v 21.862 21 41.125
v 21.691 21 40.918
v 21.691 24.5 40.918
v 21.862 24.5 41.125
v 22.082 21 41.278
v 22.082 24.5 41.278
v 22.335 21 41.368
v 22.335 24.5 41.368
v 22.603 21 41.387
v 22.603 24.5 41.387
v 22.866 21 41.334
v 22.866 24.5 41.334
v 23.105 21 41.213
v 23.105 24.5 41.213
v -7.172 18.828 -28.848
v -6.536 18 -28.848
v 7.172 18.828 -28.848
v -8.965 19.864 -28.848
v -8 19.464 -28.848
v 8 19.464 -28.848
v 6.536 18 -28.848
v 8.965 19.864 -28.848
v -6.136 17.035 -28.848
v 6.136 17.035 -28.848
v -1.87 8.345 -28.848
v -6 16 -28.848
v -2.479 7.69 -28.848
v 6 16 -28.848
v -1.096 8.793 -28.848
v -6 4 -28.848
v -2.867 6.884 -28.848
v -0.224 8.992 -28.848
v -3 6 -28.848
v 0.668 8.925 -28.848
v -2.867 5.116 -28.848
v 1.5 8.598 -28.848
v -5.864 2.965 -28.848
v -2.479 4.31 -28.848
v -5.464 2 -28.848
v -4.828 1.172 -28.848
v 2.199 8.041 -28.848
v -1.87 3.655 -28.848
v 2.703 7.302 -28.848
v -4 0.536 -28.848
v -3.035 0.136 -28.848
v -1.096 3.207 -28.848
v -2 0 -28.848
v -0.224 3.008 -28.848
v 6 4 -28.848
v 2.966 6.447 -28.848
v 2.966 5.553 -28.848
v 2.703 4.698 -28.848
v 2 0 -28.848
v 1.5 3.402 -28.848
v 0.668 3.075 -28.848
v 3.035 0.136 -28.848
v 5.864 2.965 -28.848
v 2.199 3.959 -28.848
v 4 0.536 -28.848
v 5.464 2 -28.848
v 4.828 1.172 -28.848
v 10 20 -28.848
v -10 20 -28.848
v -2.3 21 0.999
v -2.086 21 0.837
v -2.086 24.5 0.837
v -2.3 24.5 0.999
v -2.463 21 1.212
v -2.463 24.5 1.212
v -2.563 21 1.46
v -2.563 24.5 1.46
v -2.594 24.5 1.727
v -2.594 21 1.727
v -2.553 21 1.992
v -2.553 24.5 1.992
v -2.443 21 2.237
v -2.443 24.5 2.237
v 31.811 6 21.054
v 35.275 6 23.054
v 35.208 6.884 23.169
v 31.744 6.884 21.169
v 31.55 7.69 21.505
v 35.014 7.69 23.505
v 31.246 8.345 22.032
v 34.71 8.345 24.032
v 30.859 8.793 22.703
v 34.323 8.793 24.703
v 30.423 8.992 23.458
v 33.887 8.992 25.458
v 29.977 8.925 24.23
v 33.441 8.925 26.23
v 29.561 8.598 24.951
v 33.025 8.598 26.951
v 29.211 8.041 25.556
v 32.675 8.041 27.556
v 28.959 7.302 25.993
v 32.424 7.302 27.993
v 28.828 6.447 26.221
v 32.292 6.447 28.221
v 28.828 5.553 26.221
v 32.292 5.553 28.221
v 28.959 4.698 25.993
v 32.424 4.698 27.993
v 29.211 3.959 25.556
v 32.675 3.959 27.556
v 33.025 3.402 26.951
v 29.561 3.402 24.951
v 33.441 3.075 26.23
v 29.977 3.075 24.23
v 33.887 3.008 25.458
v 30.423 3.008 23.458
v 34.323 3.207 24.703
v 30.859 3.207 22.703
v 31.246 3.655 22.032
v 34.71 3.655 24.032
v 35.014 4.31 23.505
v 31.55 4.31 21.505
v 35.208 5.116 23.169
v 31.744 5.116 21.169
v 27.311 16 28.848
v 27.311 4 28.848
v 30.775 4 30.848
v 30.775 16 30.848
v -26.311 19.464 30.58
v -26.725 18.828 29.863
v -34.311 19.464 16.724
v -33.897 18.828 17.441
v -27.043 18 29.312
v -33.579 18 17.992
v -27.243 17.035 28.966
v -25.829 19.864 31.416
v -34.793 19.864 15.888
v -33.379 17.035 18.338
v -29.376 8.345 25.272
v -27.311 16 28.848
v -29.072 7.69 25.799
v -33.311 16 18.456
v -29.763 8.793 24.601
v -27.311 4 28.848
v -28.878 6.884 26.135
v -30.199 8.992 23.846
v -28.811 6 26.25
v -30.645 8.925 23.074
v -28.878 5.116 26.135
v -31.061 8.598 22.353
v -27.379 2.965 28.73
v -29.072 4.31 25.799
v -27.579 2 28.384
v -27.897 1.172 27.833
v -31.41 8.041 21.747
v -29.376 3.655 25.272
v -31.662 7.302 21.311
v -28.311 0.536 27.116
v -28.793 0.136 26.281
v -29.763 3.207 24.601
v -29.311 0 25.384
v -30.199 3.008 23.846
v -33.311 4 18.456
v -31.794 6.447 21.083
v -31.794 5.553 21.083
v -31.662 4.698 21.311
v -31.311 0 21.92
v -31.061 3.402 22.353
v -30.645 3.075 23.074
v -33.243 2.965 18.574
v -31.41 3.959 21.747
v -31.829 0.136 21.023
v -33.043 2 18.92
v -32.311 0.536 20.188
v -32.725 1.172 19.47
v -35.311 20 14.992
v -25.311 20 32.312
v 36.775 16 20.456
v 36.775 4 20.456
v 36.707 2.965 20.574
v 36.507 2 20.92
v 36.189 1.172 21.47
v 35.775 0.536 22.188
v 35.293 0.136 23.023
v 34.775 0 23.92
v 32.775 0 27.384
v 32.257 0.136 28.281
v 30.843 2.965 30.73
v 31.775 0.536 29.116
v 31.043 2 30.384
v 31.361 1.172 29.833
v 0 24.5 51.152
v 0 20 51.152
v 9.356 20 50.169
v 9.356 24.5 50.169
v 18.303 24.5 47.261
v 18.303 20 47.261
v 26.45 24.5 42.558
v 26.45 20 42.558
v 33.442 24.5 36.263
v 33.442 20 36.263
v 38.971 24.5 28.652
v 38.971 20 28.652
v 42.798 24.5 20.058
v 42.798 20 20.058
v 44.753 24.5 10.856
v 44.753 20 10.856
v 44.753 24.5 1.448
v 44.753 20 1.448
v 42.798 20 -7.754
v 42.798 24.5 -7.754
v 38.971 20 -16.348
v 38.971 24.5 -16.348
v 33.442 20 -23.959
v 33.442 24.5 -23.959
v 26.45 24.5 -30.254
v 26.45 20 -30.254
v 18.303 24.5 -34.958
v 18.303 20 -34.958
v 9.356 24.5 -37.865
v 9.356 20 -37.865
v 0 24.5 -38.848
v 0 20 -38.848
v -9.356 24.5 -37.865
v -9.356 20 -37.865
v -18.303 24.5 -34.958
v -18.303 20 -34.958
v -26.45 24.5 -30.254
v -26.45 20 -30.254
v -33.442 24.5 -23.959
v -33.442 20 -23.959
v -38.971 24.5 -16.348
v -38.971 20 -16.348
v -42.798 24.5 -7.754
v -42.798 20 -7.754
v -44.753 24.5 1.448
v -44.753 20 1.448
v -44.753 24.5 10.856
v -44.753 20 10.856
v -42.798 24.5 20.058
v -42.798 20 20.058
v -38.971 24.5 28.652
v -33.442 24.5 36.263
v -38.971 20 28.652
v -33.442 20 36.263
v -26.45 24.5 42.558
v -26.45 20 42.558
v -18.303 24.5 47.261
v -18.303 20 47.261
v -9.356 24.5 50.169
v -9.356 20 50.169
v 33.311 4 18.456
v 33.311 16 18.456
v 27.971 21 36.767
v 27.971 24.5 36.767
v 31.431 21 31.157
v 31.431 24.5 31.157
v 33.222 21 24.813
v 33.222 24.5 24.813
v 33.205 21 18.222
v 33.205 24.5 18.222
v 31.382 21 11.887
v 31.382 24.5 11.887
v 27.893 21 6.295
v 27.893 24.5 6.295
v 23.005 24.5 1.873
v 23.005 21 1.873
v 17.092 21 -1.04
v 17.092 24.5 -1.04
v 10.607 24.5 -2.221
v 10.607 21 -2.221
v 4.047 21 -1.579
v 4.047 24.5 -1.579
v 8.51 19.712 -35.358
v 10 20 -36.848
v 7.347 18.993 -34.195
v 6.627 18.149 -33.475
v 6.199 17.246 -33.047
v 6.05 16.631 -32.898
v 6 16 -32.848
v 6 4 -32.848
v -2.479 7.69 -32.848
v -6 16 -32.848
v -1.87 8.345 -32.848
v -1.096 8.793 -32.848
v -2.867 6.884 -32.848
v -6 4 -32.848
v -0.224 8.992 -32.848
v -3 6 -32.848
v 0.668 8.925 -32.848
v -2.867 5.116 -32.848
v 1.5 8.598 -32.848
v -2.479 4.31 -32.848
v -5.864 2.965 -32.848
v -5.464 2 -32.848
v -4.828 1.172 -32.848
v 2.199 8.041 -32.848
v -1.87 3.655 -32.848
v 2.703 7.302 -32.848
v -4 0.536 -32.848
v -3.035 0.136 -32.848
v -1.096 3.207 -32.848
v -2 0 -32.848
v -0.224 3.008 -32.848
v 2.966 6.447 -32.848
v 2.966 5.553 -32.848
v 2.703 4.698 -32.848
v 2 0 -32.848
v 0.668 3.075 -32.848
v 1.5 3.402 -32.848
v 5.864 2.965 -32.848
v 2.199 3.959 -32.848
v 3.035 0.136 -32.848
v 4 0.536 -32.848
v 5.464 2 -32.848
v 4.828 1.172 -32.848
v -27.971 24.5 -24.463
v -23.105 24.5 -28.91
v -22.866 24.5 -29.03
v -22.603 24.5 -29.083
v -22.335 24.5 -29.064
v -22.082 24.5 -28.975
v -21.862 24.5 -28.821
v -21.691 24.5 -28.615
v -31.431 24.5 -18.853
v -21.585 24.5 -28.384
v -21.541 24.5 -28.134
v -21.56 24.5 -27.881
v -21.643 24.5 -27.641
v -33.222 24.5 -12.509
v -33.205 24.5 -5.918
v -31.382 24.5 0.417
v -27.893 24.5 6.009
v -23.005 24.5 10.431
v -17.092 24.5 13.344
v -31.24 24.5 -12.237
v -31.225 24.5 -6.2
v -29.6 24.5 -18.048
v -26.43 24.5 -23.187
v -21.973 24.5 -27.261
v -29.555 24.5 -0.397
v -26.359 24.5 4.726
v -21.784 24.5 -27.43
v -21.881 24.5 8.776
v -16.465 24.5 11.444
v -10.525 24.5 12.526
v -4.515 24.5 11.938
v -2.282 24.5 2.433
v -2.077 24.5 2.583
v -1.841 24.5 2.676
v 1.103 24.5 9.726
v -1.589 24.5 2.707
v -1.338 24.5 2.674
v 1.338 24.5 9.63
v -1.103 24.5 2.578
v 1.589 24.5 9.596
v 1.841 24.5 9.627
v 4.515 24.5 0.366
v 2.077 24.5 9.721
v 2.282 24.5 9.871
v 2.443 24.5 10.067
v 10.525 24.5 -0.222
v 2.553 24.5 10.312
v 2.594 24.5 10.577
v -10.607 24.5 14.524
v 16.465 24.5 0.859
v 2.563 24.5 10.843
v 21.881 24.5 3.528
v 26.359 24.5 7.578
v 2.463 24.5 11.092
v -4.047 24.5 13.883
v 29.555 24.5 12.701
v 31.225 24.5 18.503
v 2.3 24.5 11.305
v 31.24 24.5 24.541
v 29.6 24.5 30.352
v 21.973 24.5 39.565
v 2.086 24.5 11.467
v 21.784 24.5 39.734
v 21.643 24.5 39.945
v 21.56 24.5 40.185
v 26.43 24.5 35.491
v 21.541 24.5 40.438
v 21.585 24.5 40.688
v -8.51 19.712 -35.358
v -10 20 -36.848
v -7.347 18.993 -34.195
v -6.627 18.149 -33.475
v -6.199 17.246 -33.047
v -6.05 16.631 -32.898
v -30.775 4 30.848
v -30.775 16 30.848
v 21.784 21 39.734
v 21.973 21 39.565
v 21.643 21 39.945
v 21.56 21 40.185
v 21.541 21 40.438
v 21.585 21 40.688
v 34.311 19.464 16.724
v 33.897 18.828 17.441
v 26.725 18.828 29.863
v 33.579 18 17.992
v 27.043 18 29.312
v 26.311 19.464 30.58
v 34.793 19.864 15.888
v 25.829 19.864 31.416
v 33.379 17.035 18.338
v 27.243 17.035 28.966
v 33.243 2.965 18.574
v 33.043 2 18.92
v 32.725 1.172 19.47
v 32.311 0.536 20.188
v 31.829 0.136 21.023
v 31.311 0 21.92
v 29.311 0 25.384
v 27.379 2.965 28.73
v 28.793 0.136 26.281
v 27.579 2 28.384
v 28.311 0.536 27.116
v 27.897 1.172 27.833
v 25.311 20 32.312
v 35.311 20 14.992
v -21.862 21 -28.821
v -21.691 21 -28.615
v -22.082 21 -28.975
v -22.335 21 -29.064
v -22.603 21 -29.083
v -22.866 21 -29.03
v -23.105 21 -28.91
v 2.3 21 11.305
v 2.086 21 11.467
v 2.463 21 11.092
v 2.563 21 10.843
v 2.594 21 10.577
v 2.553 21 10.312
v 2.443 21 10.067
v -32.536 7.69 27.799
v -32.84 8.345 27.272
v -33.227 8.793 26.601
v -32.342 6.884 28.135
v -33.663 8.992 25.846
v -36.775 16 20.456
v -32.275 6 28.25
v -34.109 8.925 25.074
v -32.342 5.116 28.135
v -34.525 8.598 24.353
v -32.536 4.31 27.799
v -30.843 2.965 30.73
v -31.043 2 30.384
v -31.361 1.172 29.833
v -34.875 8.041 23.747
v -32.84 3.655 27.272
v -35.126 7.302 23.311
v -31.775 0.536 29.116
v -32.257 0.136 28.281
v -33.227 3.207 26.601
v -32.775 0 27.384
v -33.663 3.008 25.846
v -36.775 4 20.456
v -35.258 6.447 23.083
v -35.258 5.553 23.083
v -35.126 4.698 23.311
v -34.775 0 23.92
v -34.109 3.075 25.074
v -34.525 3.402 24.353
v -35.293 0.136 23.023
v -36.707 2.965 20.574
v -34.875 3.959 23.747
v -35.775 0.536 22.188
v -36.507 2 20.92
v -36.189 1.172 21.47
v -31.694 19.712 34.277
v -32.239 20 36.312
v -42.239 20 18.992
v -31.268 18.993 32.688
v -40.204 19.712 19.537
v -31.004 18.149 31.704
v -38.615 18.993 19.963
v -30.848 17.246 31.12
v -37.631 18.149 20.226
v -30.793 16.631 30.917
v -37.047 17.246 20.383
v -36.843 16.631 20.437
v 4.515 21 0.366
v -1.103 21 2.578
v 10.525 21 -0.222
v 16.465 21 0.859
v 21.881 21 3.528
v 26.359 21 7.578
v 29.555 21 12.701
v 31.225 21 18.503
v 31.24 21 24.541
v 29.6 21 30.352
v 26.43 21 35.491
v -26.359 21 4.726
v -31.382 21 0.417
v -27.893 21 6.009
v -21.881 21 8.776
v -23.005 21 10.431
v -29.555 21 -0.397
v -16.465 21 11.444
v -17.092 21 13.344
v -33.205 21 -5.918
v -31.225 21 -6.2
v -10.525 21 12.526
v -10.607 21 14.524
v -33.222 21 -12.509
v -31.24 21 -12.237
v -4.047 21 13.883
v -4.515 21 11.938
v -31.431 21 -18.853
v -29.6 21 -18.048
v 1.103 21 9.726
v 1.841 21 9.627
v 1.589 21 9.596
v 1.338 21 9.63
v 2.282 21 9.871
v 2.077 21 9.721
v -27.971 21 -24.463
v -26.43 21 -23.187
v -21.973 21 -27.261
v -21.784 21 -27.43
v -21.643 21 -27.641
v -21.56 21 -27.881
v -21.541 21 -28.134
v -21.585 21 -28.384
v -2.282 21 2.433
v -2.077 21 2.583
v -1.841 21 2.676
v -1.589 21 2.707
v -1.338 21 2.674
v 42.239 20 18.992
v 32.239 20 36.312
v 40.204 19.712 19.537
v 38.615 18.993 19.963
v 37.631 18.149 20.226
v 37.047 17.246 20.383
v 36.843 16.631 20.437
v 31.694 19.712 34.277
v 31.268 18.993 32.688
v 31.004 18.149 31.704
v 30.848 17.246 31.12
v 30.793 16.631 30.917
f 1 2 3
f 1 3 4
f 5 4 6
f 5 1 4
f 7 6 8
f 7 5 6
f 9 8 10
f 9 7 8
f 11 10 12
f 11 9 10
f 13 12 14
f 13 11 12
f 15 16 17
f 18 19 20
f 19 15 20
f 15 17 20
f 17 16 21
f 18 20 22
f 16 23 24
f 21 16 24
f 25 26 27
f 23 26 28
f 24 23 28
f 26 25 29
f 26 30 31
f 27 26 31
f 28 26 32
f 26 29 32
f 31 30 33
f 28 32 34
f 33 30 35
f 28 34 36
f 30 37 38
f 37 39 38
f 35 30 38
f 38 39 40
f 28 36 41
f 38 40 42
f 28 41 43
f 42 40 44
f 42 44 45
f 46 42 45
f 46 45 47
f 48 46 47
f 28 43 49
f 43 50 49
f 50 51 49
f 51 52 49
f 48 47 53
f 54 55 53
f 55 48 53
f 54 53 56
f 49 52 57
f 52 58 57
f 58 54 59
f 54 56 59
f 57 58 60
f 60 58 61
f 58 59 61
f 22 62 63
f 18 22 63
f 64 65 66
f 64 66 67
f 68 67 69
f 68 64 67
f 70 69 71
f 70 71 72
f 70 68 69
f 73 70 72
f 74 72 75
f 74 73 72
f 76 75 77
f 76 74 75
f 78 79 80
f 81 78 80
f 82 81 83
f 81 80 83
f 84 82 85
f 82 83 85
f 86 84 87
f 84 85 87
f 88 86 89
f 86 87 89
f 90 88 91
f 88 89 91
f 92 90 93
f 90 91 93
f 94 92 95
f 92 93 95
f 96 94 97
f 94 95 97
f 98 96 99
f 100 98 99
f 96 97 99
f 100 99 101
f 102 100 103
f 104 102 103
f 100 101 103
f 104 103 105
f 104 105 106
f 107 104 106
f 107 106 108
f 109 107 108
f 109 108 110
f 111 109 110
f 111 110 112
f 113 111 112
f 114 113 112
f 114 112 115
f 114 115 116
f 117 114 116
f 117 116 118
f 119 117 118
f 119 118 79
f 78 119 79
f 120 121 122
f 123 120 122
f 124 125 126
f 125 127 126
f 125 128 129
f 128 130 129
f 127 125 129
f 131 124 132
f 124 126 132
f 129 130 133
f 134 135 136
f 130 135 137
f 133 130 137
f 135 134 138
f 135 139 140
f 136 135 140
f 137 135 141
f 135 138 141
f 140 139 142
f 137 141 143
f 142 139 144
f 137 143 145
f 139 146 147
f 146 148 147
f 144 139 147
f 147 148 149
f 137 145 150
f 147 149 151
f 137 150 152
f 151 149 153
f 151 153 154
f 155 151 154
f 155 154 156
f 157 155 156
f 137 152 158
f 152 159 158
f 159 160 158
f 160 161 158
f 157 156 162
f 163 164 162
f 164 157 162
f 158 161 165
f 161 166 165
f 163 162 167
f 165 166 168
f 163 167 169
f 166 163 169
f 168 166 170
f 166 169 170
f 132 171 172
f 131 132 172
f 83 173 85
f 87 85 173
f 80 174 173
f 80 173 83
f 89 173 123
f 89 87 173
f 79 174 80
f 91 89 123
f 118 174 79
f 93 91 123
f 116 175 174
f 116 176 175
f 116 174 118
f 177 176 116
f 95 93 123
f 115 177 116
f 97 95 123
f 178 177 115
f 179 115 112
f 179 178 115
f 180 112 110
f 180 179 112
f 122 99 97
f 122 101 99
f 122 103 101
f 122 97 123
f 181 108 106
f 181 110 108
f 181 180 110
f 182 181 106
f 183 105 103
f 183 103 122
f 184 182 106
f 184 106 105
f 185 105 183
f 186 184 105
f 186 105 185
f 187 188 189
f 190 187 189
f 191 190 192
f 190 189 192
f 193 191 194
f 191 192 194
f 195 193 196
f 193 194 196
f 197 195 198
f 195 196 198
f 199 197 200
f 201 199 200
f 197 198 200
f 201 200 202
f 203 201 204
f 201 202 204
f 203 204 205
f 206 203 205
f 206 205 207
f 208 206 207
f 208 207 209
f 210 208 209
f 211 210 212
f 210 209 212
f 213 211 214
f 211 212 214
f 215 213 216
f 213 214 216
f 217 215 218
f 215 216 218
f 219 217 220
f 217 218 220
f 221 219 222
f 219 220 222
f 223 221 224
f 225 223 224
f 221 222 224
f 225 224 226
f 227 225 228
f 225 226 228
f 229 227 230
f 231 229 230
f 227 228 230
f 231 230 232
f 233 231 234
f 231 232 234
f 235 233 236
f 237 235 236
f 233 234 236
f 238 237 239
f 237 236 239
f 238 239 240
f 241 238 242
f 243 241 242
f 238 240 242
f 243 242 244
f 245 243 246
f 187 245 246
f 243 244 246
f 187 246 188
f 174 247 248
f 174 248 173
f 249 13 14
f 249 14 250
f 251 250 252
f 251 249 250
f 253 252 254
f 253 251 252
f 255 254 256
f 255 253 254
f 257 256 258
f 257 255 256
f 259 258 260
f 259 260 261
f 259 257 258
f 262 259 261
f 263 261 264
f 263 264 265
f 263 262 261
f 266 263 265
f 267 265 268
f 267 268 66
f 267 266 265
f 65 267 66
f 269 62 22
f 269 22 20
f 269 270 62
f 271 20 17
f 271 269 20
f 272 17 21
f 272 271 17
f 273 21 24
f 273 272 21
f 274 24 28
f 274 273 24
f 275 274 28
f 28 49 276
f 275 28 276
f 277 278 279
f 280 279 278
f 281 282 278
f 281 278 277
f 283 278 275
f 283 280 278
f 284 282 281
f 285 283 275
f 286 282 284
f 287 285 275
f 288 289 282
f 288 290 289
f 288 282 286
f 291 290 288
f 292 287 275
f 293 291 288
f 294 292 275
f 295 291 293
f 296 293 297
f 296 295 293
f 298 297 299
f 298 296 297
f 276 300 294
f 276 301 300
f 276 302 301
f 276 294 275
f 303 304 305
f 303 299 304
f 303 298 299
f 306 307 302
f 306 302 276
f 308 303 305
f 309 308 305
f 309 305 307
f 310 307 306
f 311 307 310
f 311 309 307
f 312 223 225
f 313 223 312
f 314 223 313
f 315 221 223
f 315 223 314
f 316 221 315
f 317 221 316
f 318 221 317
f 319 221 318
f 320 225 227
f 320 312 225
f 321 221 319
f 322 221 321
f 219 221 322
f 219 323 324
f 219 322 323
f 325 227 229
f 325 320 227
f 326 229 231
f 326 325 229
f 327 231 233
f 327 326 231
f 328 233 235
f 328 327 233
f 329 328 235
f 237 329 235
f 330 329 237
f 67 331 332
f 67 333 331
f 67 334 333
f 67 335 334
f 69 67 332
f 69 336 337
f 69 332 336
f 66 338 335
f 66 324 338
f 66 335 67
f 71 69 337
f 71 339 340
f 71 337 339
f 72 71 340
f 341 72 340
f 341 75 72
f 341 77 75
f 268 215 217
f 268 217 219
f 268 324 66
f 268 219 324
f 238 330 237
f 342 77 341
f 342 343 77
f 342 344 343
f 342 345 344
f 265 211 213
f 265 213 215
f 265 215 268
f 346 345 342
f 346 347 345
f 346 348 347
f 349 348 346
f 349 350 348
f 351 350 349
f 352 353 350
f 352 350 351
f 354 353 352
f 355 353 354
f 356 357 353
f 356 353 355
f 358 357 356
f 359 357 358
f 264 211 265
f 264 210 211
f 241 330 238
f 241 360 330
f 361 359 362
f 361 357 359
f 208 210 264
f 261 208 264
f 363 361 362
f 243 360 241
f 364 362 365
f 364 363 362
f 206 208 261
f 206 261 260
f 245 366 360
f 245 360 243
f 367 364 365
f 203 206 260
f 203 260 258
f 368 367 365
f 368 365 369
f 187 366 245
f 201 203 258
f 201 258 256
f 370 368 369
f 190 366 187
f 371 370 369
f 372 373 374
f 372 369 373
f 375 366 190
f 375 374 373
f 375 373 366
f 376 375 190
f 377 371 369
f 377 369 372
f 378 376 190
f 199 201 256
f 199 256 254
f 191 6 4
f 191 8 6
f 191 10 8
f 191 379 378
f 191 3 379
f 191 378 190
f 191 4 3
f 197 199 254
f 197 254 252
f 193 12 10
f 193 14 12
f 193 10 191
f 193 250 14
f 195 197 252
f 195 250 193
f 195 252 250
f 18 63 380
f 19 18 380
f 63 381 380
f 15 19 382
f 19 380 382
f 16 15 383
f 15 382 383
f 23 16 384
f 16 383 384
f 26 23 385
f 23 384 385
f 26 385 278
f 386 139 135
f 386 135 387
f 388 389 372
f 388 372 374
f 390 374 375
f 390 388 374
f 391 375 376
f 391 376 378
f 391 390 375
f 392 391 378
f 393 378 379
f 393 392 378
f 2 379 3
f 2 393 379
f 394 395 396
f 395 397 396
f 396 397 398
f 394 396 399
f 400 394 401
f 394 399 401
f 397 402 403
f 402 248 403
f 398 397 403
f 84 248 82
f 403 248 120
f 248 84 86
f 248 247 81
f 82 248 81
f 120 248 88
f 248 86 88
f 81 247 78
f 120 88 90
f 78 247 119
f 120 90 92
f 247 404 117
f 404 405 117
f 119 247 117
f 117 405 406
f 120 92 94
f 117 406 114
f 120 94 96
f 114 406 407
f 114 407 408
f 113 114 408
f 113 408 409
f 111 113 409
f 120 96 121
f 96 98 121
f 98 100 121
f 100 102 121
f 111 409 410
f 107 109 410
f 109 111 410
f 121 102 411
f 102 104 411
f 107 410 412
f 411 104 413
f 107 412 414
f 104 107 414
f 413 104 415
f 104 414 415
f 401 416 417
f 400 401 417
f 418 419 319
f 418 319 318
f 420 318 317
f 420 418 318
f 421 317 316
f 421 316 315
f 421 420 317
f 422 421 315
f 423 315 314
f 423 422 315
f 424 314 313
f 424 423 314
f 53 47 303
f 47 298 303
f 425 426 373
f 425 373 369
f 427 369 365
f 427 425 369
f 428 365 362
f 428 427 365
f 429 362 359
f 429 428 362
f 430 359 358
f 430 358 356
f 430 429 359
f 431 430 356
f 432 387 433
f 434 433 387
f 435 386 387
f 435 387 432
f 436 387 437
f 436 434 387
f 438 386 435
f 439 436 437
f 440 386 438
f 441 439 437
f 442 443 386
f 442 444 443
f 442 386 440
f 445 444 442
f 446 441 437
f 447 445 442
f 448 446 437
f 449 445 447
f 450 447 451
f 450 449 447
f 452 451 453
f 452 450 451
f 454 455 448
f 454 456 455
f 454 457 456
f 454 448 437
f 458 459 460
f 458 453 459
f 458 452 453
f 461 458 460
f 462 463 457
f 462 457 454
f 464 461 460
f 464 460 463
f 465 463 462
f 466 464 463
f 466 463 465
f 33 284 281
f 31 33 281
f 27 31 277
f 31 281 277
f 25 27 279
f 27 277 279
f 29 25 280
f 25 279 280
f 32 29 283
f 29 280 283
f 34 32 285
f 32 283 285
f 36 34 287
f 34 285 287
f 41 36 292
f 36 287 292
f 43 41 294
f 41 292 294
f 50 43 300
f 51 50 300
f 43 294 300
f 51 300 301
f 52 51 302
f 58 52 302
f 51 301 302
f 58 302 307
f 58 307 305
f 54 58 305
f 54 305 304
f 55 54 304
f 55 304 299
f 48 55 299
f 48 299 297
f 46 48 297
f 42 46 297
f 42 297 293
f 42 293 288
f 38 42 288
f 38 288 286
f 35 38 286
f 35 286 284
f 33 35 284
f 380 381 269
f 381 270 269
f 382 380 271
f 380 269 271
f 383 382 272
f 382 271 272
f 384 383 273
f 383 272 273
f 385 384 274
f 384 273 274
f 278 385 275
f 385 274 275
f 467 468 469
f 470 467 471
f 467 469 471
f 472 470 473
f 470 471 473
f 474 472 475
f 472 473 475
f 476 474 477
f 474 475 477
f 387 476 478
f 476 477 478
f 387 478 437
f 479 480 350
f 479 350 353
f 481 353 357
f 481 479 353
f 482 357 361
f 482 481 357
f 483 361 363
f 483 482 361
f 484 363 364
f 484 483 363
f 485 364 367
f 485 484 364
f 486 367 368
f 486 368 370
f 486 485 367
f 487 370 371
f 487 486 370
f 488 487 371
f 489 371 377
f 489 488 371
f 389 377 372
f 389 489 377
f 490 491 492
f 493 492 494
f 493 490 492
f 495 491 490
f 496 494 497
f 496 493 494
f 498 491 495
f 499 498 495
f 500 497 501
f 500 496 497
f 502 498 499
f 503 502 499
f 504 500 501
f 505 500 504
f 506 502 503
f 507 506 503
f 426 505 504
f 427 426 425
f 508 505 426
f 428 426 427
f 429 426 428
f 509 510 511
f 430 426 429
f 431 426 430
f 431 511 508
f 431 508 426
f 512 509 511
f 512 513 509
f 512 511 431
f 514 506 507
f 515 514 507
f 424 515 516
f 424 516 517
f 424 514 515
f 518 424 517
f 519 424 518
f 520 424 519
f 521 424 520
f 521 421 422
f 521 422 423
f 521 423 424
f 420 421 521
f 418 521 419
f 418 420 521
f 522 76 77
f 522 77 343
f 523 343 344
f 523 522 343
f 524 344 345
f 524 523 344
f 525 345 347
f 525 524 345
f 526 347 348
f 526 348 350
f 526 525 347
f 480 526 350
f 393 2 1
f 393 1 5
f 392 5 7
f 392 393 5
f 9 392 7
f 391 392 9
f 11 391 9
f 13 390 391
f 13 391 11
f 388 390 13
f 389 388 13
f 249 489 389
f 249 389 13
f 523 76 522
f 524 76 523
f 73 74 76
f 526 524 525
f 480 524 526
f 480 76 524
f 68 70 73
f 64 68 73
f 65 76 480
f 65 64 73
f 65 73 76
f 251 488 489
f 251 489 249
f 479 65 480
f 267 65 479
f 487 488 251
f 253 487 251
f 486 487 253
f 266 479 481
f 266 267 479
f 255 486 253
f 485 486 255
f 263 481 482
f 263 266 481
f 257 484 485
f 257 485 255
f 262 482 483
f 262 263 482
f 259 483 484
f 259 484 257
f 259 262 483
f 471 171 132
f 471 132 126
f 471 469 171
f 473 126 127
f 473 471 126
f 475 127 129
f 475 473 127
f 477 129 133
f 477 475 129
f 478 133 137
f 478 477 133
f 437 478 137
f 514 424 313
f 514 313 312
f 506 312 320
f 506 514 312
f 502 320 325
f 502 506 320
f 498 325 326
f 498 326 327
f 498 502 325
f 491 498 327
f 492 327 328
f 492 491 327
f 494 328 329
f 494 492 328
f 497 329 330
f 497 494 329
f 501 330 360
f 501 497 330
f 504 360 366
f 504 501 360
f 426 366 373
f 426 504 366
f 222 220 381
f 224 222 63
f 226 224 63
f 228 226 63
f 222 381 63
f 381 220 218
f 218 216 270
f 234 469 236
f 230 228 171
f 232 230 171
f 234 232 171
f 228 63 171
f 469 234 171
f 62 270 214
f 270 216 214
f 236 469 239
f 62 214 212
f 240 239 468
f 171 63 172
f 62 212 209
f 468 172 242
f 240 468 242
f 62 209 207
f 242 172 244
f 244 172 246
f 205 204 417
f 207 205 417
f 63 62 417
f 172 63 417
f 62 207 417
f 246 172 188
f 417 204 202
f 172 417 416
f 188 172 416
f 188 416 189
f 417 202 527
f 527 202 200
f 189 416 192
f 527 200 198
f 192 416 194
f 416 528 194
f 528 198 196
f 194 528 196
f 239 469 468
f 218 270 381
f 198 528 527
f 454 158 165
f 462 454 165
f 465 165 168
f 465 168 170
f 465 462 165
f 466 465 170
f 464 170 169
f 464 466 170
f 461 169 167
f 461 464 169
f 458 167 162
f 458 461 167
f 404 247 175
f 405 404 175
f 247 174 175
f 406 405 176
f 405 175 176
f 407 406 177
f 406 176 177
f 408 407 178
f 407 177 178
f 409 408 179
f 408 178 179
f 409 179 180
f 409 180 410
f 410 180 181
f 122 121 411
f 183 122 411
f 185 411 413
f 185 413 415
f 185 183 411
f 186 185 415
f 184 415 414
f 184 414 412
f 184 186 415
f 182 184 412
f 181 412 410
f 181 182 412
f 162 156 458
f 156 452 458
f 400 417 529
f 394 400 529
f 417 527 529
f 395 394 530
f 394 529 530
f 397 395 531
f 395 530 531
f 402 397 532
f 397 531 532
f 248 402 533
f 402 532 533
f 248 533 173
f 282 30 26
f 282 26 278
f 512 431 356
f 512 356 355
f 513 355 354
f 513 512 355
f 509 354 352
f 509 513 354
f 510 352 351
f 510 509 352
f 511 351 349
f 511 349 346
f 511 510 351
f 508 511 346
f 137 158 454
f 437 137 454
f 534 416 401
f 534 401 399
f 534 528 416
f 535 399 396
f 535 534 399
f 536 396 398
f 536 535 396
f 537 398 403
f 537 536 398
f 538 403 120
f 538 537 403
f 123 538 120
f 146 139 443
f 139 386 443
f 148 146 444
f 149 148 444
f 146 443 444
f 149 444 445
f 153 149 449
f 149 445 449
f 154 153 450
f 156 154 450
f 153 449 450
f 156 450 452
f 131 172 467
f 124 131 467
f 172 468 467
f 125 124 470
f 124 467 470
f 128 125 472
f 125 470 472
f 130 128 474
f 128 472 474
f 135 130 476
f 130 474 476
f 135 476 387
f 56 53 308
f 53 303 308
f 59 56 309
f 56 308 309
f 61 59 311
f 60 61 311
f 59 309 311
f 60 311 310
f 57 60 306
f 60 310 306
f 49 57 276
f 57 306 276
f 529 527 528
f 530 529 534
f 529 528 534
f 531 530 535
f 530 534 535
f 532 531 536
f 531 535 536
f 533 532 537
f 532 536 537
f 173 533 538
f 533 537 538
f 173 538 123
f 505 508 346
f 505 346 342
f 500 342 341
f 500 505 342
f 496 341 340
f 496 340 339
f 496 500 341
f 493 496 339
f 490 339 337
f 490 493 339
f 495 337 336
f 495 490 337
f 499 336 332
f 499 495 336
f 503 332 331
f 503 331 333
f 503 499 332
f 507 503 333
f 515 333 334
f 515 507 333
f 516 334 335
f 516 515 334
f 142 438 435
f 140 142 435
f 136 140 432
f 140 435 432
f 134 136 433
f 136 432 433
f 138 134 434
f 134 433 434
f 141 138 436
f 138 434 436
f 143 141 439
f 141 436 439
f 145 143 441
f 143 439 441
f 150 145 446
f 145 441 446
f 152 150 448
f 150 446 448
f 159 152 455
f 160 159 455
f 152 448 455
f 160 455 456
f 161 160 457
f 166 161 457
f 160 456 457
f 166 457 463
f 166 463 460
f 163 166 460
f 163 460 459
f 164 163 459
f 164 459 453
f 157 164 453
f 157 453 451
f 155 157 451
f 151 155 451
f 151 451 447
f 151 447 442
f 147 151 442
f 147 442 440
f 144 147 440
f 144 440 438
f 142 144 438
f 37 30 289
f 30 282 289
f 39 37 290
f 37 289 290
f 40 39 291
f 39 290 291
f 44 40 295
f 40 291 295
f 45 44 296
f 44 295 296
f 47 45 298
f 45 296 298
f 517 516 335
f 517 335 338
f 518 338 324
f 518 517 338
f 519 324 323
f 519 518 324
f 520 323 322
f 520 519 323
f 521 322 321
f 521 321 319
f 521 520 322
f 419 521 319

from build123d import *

# Parameters (mm, degrees)
SKETCH2_W                = 12
SKETCH2_H                = 4
BOSS_EXTRUDE2_DEPTH      = 20
SKETCH4_R                = 45
BOSS_EXTRUDE3_DEPTH      = 4.5
FILLET1_R                = 4
CUT_EXTRUDE1_REACH       = 100.393
SKETCH5_R                = 3
FILLET2_R                = 4
CIRPATTERN5_COUNT        = 3
FILLET1_OF_CIRPATTERN5_R = 4
FILLET2_OF_CIRPATTERN5_R = 4
CAVITY1_START            = 21
CAVITY1_DEPTH            = 3.5
CAVITY2_START            = 21
CAVITY2_DEPTH            = 3.5


# Read off the part's stored shape, not the designer's step: Cavity1, Cavity2
with BuildPart() as part:
    # Sketch2 → Boss-Extrude2 (new body)
    with BuildSketch(Plane(origin=(0, 0, 0), x_dir=(1, 0, 0), z_dir=(0, 1, 0))):
        with Locations((0, 30.848076211)):
            Rectangle(SKETCH2_W, SKETCH2_H)
    boss_extrude2 = extrude(amount=BOSS_EXTRUDE2_DEPTH)

    # Sketch4 → Boss-Extrude3 (add)
    with BuildSketch(Plane(origin=(0, 20, 0), x_dir=(1, 0, 0), z_dir=(0, 1, 0))):
        with Locations(Location((0, -6.151923789, 0), (0, 0, 270))):
            Circle(SKETCH4_R)
    extrude(amount=BOSS_EXTRUDE3_DEPTH)

    # Fillet1
    fillet1_edges = [part.edges().sort_by_distance(p)[0] for p in [
        (-6, 20, -30.848076211),
        (6, 20, -30.848076211),
        (0, 20, -32.848076211),
    ]]
    fillet(fillet1_edges, radius=FILLET1_R)

    # Sketch5 → Cut-Extrude1 (cut, up to next)
    with BuildSketch(Plane(origin=(0, 0, -32.848076211), x_dir=(-1, 0, 0), z_dir=(0, 0, -1)), mode=Mode.PRIVATE) as cut_extrude1_sk1:
        with Locations((0, 6)):
            Circle(SKETCH5_R)
    cut_extrude1_tool1 = extrude(cut_extrude1_sk1.sketch, amount=-CUT_EXTRUDE1_REACH, mode=Mode.PRIVATE) & part.part
    cut_extrude1 = cut_extrude1_tool1.solids().sort_by_distance((0, 6, -32.848076))[0]
    add(cut_extrude1, mode=Mode.SUBTRACT)

    # Fillet2
    fillet2_edges = [part.edges().sort_by_distance(p)[0] for p in [
        (-6, 0, -30.848076211),
        (6, 0, -30.848076211),
    ]]
    fillet(fillet2_edges, radius=FILLET2_R)

    # CirPattern5: Boss-Extrude2, Cut-Extrude1 ×3 about axis
    cirpattern5_axis = Axis((0, 0, 6.151923789), (0, 1, 0))
    add([boss_extrude2.rotate(cirpattern5_axis, i * 360 / CIRPATTERN5_COUNT) for i in range(1, CIRPATTERN5_COUNT)])
    add([cut_extrude1.rotate(cirpattern5_axis, i * 360 / CIRPATTERN5_COUNT) for i in range(1, CIRPATTERN5_COUNT)], mode=Mode.SUBTRACT)

    # Fillet1 of CirPattern5
    fillet1_of_cirpattern5_edges = [part.edges().sort_by_distance(p)[0] for p in [
        (-29.04293994, 20, 29.848076211),
        (-35.04293994, 20, 19.455771366),
        (-33.774990748, 20, 25.651923789),
        (35.04293994, 20, 19.455771366),
        (29.04293994, 20, 29.848076211),
        (33.774990748, 20, 25.651923789),
    ]]
    fillet(fillet1_of_cirpattern5_edges, radius=FILLET1_OF_CIRPATTERN5_R)

    # Fillet2 of CirPattern5
    fillet2_of_cirpattern5_edges = [part.edges().sort_by_distance(p)[0] for p in [
        (-29.04293994, 0, 29.848076211),
        (-35.04293994, 0, 19.455771366),
        (35.04293994, 0, 19.455771366),
        (29.04293994, 0, 29.848076211),
    ]]
    fillet(fillet2_of_cirpattern5_edges, radius=FILLET2_OF_CIRPATTERN5_R)

    # Cavity1 outline → Cavity1 (cut)
    with BuildSketch(Plane(origin=(0, 0, 0), x_dir=(1, 0, 0), z_dir=(0, 1, 0)).offset(CAVITY1_START)):
        with BuildLine():
            ThreePointArc((2.442725539, -10.067144534), (1.841235151, -9.627440673), (1.102669127, -9.725677123))
            ThreePointArc((1.102669127, -9.725677123), (-28.135128354, -2.275427339), (-21.973365635, 27.260782702))
            ThreePointArc((-21.973365635, 27.260782702), (-21.560444182, 27.88096497), (-21.690953471, 28.614516261))
            ThreePointArc((-21.690953471, 28.614516261), (-22.33514846, 29.064110473), (-23.10537251, 28.909588462))
            ThreePointArc((-23.10537251, 28.909588462), (-29.831959556, -3.334088698), (2.085950749, -11.467273303))
            ThreePointArc((2.085950749, -11.467273303), (2.563344478, -10.843400426), (2.442725539, -10.067144534))
        make_face()
    extrude(amount=CAVITY1_DEPTH, mode=Mode.SUBTRACT)

    # Cavity2 outline → Cavity2 (cut)
    with BuildSketch(Plane(origin=(0, 0, 0), x_dir=(1, 0, 0), z_dir=(0, 1, 0)).offset(CAVITY2_START)):
        with BuildLine():
            ThreePointArc((-2.442725539, -2.236703043), (-1.841235151, -2.676406904), (-1.102669127, -2.578170454))
            ThreePointArc((-1.102669127, -2.578170454), (28.135128354, -10.028420238), (21.973365635, -39.564630279))
            ThreePointArc((21.973365635, -39.564630279), (21.560444182, -40.184812547), (21.690953471, -40.918363839))
            ThreePointArc((21.690953471, -40.918363839), (22.33514846, -41.36795805), (23.10537251, -41.213436039))
            ThreePointArc((23.10537251, -41.213436039), (29.831959556, -8.96975888), (-2.085950749, -0.836574274))
            ThreePointArc((-2.085950749, -0.836574274), (-2.563344478, -1.460447151), (-2.442725539, -2.236703043))
        make_face()
    extrude(amount=CAVITY2_DEPTH, mode=Mode.SUBTRACT)


solid = part.part
